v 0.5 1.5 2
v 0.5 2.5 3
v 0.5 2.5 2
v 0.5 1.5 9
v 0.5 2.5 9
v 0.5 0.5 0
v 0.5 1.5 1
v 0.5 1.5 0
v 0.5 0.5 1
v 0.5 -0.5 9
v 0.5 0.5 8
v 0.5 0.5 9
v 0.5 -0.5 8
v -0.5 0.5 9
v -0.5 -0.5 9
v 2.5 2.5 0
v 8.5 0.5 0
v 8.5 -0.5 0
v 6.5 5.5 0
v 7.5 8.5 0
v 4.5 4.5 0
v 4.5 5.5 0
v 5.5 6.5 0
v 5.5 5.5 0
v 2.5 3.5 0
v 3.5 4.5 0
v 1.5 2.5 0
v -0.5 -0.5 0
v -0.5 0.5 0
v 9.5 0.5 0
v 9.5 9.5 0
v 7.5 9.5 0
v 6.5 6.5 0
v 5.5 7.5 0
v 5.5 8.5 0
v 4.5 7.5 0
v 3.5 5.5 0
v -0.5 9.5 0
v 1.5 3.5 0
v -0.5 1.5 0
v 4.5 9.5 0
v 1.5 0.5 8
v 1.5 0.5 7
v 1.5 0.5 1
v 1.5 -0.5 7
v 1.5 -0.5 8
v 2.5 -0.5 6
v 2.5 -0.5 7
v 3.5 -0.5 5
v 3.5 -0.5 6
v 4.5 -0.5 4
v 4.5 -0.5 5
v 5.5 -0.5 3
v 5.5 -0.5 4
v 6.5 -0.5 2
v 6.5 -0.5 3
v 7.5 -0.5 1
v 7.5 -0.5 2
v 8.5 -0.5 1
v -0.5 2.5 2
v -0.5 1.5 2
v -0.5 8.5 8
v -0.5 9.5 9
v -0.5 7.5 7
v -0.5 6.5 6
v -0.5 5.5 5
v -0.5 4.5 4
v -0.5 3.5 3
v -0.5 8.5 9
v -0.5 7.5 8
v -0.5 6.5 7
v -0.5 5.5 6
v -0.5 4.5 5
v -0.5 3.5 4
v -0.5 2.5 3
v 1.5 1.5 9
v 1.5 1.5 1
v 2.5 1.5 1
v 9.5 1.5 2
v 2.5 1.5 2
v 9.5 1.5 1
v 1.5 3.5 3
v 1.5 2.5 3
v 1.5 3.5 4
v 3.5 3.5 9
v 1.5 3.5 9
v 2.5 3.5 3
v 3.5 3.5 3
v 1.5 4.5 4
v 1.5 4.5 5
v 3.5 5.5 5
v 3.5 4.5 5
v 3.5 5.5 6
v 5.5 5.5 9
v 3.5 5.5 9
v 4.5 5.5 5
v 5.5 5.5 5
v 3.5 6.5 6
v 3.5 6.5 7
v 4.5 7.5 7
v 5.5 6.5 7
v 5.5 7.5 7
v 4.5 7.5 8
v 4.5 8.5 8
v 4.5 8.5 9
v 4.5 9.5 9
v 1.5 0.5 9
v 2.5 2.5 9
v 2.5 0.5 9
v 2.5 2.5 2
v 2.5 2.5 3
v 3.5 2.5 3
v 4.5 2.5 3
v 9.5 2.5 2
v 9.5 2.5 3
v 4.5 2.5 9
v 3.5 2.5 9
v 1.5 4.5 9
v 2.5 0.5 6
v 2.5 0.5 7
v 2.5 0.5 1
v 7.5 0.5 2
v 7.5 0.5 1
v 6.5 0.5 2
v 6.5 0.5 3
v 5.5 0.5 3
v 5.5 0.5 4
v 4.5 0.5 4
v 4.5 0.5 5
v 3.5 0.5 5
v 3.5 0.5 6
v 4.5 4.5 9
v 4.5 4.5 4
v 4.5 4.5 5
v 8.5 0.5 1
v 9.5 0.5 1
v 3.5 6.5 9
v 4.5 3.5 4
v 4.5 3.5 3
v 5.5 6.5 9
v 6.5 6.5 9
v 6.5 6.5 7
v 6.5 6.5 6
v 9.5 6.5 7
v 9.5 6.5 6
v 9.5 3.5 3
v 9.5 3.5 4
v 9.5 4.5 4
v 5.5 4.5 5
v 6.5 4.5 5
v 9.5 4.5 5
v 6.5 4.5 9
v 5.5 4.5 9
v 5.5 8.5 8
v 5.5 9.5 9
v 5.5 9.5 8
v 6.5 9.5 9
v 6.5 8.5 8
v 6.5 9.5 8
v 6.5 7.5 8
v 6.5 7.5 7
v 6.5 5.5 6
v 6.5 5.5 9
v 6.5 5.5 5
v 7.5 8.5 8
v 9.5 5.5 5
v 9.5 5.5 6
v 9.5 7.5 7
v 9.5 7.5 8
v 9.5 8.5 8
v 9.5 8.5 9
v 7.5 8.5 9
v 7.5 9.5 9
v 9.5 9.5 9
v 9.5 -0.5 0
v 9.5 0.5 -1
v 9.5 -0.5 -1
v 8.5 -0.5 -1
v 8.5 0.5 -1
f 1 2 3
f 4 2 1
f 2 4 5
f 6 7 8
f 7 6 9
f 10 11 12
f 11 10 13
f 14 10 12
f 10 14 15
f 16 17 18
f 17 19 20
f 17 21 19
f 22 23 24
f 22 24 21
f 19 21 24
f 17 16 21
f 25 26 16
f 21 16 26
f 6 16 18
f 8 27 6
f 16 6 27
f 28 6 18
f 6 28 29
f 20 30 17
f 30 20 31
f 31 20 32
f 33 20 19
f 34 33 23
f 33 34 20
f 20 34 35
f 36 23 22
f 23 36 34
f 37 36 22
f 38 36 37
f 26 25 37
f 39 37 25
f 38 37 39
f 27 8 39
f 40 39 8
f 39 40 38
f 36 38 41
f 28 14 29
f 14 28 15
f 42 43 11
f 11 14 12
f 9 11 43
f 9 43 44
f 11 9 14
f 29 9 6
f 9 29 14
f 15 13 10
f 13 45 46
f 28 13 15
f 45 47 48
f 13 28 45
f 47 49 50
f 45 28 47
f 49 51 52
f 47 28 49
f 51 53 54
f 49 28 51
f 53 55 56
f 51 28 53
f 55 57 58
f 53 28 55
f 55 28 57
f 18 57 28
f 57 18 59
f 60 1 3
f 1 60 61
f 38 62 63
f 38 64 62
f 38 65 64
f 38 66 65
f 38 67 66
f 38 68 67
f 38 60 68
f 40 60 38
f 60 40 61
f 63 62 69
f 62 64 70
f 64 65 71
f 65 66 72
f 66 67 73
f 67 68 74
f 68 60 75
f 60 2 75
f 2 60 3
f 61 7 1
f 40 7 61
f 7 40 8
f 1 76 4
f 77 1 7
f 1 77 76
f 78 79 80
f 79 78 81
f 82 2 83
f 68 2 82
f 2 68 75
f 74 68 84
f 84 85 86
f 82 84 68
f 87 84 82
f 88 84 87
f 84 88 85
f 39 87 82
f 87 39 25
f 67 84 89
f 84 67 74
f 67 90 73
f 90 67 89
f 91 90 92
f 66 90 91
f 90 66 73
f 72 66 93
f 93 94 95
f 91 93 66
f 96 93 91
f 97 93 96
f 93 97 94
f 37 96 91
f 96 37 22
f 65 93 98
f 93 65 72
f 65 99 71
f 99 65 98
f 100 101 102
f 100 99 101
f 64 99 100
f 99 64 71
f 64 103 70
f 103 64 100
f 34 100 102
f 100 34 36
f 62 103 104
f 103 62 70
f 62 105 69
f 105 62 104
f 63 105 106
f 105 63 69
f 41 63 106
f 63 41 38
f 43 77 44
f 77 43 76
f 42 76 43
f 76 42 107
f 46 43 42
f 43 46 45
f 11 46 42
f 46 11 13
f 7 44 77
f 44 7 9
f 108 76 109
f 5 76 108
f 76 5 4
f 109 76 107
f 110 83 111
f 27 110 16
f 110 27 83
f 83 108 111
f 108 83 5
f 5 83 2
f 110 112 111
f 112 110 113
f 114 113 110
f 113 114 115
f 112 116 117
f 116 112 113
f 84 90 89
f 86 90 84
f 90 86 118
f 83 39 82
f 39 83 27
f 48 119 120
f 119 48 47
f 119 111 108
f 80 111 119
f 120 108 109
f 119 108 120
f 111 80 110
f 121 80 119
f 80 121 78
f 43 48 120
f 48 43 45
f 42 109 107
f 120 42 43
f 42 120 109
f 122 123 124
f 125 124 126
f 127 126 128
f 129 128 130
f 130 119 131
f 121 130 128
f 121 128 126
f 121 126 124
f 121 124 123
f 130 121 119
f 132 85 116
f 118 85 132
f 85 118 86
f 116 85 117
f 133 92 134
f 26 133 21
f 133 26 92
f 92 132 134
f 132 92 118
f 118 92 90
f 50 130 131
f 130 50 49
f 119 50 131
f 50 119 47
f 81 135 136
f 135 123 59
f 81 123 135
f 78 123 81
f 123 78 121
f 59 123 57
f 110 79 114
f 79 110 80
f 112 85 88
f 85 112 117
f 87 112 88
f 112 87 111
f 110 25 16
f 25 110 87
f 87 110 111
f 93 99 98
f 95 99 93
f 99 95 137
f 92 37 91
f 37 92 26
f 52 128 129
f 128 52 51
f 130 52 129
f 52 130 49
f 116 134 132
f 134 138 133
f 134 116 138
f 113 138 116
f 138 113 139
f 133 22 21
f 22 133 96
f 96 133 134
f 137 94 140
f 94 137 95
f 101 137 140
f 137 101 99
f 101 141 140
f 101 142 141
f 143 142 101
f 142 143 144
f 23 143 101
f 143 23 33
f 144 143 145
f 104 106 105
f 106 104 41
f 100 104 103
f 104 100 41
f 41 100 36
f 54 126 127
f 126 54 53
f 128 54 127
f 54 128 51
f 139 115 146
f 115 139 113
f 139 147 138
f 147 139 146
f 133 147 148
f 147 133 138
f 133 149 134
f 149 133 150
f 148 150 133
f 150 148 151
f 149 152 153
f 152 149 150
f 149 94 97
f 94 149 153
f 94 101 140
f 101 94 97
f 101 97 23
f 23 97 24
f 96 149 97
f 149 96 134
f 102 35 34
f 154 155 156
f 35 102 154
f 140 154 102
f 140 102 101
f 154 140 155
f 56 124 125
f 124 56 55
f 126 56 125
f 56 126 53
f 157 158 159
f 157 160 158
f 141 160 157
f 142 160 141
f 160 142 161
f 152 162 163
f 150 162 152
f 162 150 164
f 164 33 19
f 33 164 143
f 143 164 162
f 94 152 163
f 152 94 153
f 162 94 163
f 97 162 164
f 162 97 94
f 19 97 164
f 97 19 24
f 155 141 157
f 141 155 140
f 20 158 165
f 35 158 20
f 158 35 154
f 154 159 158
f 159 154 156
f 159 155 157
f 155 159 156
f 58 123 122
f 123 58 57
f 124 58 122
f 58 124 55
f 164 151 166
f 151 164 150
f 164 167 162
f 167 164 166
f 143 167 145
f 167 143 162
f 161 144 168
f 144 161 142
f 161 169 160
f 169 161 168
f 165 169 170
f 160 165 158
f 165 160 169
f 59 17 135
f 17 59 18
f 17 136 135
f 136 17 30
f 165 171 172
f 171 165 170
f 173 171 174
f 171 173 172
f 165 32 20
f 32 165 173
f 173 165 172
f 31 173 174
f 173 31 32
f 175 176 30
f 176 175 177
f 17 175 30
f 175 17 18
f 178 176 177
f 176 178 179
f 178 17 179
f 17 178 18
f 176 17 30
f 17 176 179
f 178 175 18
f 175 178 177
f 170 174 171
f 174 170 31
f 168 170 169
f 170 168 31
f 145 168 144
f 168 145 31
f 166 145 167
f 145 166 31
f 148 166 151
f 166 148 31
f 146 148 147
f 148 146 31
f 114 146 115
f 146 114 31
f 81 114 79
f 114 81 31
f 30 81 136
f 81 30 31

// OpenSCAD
union() {
    translate([0, 0, 4.5]) cube([1, 1, 9], center=true);
    translate([0, 2, 1.0]) cube([1, 1, 2], center=true);
    translate([0, 3, 1.5]) cube([1, 1, 3], center=true);
    translate([0, 4, 2.0]) cube([1, 1, 4], center=true);
    translate([0, 5, 2.5]) cube([1, 1, 5], center=true);
    translate([0, 6, 3.0]) cube([1, 1, 6], center=true);
    translate([0, 7, 3.5]) cube([1, 1, 7], center=true);
    translate([0, 8, 4.0]) cube([1, 1, 8], center=true);
    translate([0, 9, 4.5]) cube([1, 1, 9], center=true);
    translate([1, 0, 4.0]) cube([1, 1, 8], center=true);
    translate([1, 1, 0.5]) cube([1, 1, 1], center=true);
    translate([1, 2, 4.5]) cube([1, 1, 9], center=true);
    translate([1, 3, 1.5]) cube([1, 1, 3], center=true);
    translate([1, 4, 2.0]) cube([1, 1, 4], center=true);
    translate([1, 5, 2.5]) cube([1, 1, 5], center=true);
    translate([1, 6, 3.0]) cube([1, 1, 6], center=true);
    translate([1, 7, 3.5]) cube([1, 1, 7], center=true);
    translate([1, 8, 4.0]) cube([1, 1, 8], center=true);
    translate([1, 9, 4.5]) cube([1, 1, 9], center=true);
    translate([2, 0, 3.5]) cube([1, 1, 7], center=true);
    translate([2, 1, 4.5]) cube([1, 1, 9], center=true);
    translate([2, 2, 4.5]) cube([1, 1, 9], center=true);
    translate([2, 4, 4.5]) cube([1, 1, 9], center=true);
    translate([2, 5, 2.5]) cube([1, 1, 5], center=true);
    translate([2, 6, 3.0]) cube([1, 1, 6], center=true);
    translate([2, 7, 3.5]) cube([1, 1, 7], center=true);
    translate([2, 8, 4.0]) cube([1, 1, 8], center=true);
    translate([2, 9, 4.5]) cube([1, 1, 9], center=true);
    translate([3, 0, 3.0]) cube([1, 1, 6], center=true);
    translate([3, 1, 0.5]) cube([1, 1, 1], center=true);
    translate([3, 2, 1.0]) cube([1, 1, 2], center=true);
    translate([3, 3, 1.5]) cube([1, 1, 3], center=true);
    translate([3, 4, 4.5]) cube([1, 1, 9], center=true);
    translate([3, 5, 2.5]) cube([1, 1, 5], center=true);
    translate([3, 6, 3.0]) cube([1, 1, 6], center=true);
    translate([3, 7, 3.5]) cube([1, 1, 7], center=true);
    translate([3, 8, 4.0]) cube([1, 1, 8], center=true);
    translate([3, 9, 4.5]) cube([1, 1, 9], center=true);
    translate([4, 0, 2.5]) cube([1, 1, 5], center=true);
    translate([4, 1, 0.5]) cube([1, 1, 1], center=true);
    translate([4, 2, 1.0]) cube([1, 1, 2], center=true);
    translate([4, 3, 4.5]) cube([1, 1, 9], center=true);
    translate([4, 4, 4.5]) cube([1, 1, 9], center=true);
    translate([4, 6, 4.5]) cube([1, 1, 9], center=true);
    translate([4, 7, 3.5]) cube([1, 1, 7], center=true);
    translate([4, 8, 4.0]) cube([1, 1, 8], center=true);
    translate([4, 9, 4.5]) cube([1, 1, 9], center=true);
    translate([5, 0, 2.0]) cube([1, 1, 4], center=true);
    translate([5, 1, 0.5]) cube([1, 1, 1], center=true);
    translate([5, 2, 1.0]) cube([1, 1, 2], center=true);
    translate([5, 3, 1.5]) cube([1, 1, 3], center=true);
    translate([5, 4, 2.0]) cube([1, 1, 4], center=true);
    translate([5, 5, 2.5]) cube([1, 1, 5], center=true);
    translate([5, 6, 4.5]) cube([1, 1, 9], center=true);
    translate([5, 7, 3.5]) cube([1, 1, 7], center=true);
    translate([6, 0, 1.5]) cube([1, 1, 3], center=true);
    translate([6, 1, 0.5]) cube([1, 1, 1], center=true);
    translate([6, 2, 1.0]) cube([1, 1, 2], center=true);
    translate([6, 3, 1.5]) cube([1, 1, 3], center=true);
    translate([6, 4, 2.0]) cube([1, 1, 4], center=true);
    translate([6, 5, 4.5]) cube([1, 1, 9], center=true);
    translate([6, 7, 4.5]) cube([1, 1, 9], center=true);
    translate([6, 8, 4.5]) cube([1, 1, 9], center=true);
    translate([6, 9, 8.5]) color([0, 0, 1]) cube([1, 1, 1], center=true);
    translate([7, 0, 1.0]) cube([1, 1, 2], center=true);
    translate([7, 1, 0.5]) cube([1, 1, 1], center=true);
    translate([7, 2, 1.0]) cube([1, 1, 2], center=true);
    translate([7, 3, 1.5]) cube([1, 1, 3], center=true);
    translate([7, 4, 2.0]) cube([1, 1, 4], center=true);
    translate([7, 5, 2.5]) cube([1, 1, 5], center=true);
    translate([7, 6, 3.0]) cube([1, 1, 6], center=true);
    translate([7, 7, 3.5]) cube([1, 1, 7], center=true);
    translate([7, 8, 4.0]) cube([1, 1, 8], center=true);
    translate([8, 0, 0.5]) cube([1, 1, 1], center=true);
    translate([8, 1, 0.5]) cube([1, 1, 1], center=true);
    translate([8, 2, 1.0]) cube([1, 1, 2], center=true);
    translate([8, 3, 1.5]) cube([1, 1, 3], center=true);
    translate([8, 4, 2.0]) cube([1, 1, 4], center=true);
    translate([8, 5, 2.5]) cube([1, 1, 5], center=true);
    translate([8, 6, 3.0]) cube([1, 1, 6], center=true);
    translate([8, 7, 3.5]) cube([1, 1, 7], center=true);
    translate([8, 8, 4.0]) cube([1, 1, 8], center=true);
    translate([8, 9, 4.5]) cube([1, 1, 9], center=true);
    translate([9, 0, -0.5]) color([1, 0, 0]) cube([1, 1, 1], center=true);
    translate([9, 1, 0.5]) cube([1, 1, 1], center=true);
    translate([9, 2, 1.0]) cube([1, 1, 2], center=true);
    translate([9, 3, 1.5]) cube([1, 1, 3], center=true);
    translate([9, 4, 2.0]) cube([1, 1, 4], center=true);
    translate([9, 5, 2.5]) cube([1, 1, 5], center=true);
    translate([9, 6, 3.0]) cube([1, 1, 6], center=true);
    translate([9, 7, 3.5]) cube([1, 1, 7], center=true);
    translate([9, 8, 4.0]) cube([1, 1, 8], center=true);
    translate([9, 9, 4.5]) cube([1, 1, 9], center=true);
}
